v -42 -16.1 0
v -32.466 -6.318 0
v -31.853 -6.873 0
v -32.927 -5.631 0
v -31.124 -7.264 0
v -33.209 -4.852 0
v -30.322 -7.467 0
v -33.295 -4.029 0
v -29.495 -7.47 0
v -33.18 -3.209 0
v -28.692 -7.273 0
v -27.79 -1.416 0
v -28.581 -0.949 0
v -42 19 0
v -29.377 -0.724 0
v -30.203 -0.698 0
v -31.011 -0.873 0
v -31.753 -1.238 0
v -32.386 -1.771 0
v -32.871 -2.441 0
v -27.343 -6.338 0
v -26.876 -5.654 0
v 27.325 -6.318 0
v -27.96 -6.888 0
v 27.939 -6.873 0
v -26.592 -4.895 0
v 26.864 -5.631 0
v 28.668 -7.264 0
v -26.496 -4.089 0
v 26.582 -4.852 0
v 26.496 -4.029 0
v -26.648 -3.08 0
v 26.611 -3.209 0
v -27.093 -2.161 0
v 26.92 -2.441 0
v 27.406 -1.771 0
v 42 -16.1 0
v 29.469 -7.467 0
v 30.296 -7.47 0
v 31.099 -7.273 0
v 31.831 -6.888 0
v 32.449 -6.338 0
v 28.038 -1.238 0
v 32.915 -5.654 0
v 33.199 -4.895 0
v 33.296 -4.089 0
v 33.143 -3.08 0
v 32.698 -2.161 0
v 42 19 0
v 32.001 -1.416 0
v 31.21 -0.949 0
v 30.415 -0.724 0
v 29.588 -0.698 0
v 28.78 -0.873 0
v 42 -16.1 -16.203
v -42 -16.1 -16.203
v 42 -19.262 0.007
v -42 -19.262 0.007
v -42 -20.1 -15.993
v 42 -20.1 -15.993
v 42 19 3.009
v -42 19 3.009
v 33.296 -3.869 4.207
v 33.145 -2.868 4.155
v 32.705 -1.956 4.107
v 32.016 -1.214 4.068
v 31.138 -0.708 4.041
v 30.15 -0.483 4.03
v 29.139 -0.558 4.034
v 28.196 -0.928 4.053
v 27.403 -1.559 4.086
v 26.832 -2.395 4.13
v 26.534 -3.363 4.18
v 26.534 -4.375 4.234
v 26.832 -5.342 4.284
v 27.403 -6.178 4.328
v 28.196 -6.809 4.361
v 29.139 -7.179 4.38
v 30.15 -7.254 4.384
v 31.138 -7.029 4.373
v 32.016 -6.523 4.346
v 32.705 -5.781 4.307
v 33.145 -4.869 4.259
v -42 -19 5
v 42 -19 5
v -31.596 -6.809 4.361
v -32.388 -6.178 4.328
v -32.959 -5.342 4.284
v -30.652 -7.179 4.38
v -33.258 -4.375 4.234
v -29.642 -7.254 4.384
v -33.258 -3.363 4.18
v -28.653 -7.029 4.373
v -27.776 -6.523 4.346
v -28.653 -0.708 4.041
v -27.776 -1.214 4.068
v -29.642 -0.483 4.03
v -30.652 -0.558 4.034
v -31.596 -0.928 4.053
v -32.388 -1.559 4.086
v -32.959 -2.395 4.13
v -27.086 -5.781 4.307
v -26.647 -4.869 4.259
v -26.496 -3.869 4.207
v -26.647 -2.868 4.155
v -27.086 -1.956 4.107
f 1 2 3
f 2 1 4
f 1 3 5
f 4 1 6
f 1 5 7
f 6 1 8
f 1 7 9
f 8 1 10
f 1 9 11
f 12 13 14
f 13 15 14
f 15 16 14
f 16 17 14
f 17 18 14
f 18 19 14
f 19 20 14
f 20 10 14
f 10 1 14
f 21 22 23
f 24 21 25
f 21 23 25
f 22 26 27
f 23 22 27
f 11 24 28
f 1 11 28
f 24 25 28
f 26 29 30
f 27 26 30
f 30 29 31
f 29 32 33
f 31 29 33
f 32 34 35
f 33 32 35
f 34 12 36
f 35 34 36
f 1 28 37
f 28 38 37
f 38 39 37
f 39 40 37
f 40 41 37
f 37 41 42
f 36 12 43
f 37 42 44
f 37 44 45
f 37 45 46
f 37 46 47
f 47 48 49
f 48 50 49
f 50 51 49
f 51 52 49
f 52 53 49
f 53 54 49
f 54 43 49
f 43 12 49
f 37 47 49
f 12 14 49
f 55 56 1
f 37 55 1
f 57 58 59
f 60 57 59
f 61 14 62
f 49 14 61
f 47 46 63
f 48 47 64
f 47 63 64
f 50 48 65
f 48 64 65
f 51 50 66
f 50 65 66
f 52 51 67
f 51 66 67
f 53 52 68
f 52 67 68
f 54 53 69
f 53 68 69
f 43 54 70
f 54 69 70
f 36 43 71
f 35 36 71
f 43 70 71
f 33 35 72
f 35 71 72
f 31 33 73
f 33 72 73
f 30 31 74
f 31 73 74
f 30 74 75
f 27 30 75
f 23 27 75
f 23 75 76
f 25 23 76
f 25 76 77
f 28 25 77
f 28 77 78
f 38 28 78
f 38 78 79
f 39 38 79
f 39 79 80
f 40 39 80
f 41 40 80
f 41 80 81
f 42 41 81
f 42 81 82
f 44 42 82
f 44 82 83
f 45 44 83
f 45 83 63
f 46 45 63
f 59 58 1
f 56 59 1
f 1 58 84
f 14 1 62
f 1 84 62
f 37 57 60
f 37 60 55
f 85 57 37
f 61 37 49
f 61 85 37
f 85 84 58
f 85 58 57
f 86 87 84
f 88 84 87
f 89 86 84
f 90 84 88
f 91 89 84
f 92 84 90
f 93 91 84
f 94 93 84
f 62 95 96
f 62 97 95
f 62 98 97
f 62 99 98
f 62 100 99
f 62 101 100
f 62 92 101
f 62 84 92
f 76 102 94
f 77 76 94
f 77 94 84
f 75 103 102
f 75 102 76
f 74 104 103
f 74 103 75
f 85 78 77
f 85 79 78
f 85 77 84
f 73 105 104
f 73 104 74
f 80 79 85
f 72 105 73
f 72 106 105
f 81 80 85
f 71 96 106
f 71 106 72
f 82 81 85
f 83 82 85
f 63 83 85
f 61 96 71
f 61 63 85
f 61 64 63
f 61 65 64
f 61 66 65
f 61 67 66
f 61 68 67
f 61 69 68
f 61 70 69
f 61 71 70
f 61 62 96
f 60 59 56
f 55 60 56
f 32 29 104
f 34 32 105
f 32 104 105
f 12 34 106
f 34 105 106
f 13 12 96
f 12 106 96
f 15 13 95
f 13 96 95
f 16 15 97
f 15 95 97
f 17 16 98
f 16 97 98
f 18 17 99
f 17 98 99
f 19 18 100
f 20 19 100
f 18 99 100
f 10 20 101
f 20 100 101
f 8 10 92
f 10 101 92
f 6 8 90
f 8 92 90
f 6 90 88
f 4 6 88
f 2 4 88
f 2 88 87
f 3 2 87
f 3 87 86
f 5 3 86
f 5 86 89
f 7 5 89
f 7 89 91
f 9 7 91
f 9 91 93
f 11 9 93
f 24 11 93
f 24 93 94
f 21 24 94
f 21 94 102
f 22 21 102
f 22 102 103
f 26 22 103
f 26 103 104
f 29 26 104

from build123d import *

# Parameters (mm, degrees)
SKETCH1_W           = 84
SKETCH1_H           = 38
BOSS_EXTRUDE1_DEPTH = 5
SKETCH2_W           = 84
SKETCH2_H           = 42
CUT_REVOLVE1_ANGLE  = 3
SKETCH5_W           = 84
SKETCH5_H           = 5
REVOLVE1_ANGLE      = 3
BOSS_EXTRUDE3_DEPTH = 84
SKETCH4_R           = 3.4
CUT_EXTRUDE1_DEPTH  = 10


with BuildPart() as part:
    # Sketch1 → Boss-Extrude1 (new body)
    with BuildSketch(Plane.XY):
        Rectangle(SKETCH1_W, SKETCH1_H)
    extrude(amount=BOSS_EXTRUDE1_DEPTH)

    # Sketch2 → Cut-Revolve1 (revolve, cut)
    with BuildSketch(Plane.XY.offset(5)):
        with Locations((0, 2)):
            Rectangle(SKETCH2_W, SKETCH2_H)
    revolve(axis=Axis((-42, -19, 5), (-1, 0, 0)), revolution_arc=CUT_REVOLVE1_ANGLE, mode=Mode.SUBTRACT)

    # Sketch5 → Revolve1 (revolve)
    with BuildSketch(Plane.XZ.offset(19)):
        with Locations((0, 2.5)):
            Rectangle(SKETCH5_W, SKETCH5_H)
    revolve(axis=Axis((-42, -19, 5), (-1, 0, 0)), revolution_arc=REVOLVE1_ANGLE)

    # Sketch6 → Boss-Extrude3 (add)
    with BuildSketch(Plane(origin=(-42, 0, 0), x_dir=(0, -1, 0), z_dir=(-1, 0, 0))):
        Polygon((19.261679781, 0.006852326), (20.10020425, -15.993147674), (16.10020425, -16.202778791), (16.10020425, 0), align=None)
    extrude(amount=-BOSS_EXTRUDE3_DEPTH)

    # Sketch4 → Cut-Extrude1 (cut)
    with BuildSketch(Plane(origin=(0, 0.209279164, 3.993284337), x_dir=(1, 0, 0), z_dir=(0, 0.052335956, 0.998629535))):
        with Locations((29.895651858, -4.083491794)):
            Circle(SKETCH4_R)
        with Locations((-29.895651858, -4.083491794)):
            Circle(SKETCH4_R)
    extrude(amount=-CUT_EXTRUDE1_DEPTH, mode=Mode.SUBTRACT)


solid = part.part
